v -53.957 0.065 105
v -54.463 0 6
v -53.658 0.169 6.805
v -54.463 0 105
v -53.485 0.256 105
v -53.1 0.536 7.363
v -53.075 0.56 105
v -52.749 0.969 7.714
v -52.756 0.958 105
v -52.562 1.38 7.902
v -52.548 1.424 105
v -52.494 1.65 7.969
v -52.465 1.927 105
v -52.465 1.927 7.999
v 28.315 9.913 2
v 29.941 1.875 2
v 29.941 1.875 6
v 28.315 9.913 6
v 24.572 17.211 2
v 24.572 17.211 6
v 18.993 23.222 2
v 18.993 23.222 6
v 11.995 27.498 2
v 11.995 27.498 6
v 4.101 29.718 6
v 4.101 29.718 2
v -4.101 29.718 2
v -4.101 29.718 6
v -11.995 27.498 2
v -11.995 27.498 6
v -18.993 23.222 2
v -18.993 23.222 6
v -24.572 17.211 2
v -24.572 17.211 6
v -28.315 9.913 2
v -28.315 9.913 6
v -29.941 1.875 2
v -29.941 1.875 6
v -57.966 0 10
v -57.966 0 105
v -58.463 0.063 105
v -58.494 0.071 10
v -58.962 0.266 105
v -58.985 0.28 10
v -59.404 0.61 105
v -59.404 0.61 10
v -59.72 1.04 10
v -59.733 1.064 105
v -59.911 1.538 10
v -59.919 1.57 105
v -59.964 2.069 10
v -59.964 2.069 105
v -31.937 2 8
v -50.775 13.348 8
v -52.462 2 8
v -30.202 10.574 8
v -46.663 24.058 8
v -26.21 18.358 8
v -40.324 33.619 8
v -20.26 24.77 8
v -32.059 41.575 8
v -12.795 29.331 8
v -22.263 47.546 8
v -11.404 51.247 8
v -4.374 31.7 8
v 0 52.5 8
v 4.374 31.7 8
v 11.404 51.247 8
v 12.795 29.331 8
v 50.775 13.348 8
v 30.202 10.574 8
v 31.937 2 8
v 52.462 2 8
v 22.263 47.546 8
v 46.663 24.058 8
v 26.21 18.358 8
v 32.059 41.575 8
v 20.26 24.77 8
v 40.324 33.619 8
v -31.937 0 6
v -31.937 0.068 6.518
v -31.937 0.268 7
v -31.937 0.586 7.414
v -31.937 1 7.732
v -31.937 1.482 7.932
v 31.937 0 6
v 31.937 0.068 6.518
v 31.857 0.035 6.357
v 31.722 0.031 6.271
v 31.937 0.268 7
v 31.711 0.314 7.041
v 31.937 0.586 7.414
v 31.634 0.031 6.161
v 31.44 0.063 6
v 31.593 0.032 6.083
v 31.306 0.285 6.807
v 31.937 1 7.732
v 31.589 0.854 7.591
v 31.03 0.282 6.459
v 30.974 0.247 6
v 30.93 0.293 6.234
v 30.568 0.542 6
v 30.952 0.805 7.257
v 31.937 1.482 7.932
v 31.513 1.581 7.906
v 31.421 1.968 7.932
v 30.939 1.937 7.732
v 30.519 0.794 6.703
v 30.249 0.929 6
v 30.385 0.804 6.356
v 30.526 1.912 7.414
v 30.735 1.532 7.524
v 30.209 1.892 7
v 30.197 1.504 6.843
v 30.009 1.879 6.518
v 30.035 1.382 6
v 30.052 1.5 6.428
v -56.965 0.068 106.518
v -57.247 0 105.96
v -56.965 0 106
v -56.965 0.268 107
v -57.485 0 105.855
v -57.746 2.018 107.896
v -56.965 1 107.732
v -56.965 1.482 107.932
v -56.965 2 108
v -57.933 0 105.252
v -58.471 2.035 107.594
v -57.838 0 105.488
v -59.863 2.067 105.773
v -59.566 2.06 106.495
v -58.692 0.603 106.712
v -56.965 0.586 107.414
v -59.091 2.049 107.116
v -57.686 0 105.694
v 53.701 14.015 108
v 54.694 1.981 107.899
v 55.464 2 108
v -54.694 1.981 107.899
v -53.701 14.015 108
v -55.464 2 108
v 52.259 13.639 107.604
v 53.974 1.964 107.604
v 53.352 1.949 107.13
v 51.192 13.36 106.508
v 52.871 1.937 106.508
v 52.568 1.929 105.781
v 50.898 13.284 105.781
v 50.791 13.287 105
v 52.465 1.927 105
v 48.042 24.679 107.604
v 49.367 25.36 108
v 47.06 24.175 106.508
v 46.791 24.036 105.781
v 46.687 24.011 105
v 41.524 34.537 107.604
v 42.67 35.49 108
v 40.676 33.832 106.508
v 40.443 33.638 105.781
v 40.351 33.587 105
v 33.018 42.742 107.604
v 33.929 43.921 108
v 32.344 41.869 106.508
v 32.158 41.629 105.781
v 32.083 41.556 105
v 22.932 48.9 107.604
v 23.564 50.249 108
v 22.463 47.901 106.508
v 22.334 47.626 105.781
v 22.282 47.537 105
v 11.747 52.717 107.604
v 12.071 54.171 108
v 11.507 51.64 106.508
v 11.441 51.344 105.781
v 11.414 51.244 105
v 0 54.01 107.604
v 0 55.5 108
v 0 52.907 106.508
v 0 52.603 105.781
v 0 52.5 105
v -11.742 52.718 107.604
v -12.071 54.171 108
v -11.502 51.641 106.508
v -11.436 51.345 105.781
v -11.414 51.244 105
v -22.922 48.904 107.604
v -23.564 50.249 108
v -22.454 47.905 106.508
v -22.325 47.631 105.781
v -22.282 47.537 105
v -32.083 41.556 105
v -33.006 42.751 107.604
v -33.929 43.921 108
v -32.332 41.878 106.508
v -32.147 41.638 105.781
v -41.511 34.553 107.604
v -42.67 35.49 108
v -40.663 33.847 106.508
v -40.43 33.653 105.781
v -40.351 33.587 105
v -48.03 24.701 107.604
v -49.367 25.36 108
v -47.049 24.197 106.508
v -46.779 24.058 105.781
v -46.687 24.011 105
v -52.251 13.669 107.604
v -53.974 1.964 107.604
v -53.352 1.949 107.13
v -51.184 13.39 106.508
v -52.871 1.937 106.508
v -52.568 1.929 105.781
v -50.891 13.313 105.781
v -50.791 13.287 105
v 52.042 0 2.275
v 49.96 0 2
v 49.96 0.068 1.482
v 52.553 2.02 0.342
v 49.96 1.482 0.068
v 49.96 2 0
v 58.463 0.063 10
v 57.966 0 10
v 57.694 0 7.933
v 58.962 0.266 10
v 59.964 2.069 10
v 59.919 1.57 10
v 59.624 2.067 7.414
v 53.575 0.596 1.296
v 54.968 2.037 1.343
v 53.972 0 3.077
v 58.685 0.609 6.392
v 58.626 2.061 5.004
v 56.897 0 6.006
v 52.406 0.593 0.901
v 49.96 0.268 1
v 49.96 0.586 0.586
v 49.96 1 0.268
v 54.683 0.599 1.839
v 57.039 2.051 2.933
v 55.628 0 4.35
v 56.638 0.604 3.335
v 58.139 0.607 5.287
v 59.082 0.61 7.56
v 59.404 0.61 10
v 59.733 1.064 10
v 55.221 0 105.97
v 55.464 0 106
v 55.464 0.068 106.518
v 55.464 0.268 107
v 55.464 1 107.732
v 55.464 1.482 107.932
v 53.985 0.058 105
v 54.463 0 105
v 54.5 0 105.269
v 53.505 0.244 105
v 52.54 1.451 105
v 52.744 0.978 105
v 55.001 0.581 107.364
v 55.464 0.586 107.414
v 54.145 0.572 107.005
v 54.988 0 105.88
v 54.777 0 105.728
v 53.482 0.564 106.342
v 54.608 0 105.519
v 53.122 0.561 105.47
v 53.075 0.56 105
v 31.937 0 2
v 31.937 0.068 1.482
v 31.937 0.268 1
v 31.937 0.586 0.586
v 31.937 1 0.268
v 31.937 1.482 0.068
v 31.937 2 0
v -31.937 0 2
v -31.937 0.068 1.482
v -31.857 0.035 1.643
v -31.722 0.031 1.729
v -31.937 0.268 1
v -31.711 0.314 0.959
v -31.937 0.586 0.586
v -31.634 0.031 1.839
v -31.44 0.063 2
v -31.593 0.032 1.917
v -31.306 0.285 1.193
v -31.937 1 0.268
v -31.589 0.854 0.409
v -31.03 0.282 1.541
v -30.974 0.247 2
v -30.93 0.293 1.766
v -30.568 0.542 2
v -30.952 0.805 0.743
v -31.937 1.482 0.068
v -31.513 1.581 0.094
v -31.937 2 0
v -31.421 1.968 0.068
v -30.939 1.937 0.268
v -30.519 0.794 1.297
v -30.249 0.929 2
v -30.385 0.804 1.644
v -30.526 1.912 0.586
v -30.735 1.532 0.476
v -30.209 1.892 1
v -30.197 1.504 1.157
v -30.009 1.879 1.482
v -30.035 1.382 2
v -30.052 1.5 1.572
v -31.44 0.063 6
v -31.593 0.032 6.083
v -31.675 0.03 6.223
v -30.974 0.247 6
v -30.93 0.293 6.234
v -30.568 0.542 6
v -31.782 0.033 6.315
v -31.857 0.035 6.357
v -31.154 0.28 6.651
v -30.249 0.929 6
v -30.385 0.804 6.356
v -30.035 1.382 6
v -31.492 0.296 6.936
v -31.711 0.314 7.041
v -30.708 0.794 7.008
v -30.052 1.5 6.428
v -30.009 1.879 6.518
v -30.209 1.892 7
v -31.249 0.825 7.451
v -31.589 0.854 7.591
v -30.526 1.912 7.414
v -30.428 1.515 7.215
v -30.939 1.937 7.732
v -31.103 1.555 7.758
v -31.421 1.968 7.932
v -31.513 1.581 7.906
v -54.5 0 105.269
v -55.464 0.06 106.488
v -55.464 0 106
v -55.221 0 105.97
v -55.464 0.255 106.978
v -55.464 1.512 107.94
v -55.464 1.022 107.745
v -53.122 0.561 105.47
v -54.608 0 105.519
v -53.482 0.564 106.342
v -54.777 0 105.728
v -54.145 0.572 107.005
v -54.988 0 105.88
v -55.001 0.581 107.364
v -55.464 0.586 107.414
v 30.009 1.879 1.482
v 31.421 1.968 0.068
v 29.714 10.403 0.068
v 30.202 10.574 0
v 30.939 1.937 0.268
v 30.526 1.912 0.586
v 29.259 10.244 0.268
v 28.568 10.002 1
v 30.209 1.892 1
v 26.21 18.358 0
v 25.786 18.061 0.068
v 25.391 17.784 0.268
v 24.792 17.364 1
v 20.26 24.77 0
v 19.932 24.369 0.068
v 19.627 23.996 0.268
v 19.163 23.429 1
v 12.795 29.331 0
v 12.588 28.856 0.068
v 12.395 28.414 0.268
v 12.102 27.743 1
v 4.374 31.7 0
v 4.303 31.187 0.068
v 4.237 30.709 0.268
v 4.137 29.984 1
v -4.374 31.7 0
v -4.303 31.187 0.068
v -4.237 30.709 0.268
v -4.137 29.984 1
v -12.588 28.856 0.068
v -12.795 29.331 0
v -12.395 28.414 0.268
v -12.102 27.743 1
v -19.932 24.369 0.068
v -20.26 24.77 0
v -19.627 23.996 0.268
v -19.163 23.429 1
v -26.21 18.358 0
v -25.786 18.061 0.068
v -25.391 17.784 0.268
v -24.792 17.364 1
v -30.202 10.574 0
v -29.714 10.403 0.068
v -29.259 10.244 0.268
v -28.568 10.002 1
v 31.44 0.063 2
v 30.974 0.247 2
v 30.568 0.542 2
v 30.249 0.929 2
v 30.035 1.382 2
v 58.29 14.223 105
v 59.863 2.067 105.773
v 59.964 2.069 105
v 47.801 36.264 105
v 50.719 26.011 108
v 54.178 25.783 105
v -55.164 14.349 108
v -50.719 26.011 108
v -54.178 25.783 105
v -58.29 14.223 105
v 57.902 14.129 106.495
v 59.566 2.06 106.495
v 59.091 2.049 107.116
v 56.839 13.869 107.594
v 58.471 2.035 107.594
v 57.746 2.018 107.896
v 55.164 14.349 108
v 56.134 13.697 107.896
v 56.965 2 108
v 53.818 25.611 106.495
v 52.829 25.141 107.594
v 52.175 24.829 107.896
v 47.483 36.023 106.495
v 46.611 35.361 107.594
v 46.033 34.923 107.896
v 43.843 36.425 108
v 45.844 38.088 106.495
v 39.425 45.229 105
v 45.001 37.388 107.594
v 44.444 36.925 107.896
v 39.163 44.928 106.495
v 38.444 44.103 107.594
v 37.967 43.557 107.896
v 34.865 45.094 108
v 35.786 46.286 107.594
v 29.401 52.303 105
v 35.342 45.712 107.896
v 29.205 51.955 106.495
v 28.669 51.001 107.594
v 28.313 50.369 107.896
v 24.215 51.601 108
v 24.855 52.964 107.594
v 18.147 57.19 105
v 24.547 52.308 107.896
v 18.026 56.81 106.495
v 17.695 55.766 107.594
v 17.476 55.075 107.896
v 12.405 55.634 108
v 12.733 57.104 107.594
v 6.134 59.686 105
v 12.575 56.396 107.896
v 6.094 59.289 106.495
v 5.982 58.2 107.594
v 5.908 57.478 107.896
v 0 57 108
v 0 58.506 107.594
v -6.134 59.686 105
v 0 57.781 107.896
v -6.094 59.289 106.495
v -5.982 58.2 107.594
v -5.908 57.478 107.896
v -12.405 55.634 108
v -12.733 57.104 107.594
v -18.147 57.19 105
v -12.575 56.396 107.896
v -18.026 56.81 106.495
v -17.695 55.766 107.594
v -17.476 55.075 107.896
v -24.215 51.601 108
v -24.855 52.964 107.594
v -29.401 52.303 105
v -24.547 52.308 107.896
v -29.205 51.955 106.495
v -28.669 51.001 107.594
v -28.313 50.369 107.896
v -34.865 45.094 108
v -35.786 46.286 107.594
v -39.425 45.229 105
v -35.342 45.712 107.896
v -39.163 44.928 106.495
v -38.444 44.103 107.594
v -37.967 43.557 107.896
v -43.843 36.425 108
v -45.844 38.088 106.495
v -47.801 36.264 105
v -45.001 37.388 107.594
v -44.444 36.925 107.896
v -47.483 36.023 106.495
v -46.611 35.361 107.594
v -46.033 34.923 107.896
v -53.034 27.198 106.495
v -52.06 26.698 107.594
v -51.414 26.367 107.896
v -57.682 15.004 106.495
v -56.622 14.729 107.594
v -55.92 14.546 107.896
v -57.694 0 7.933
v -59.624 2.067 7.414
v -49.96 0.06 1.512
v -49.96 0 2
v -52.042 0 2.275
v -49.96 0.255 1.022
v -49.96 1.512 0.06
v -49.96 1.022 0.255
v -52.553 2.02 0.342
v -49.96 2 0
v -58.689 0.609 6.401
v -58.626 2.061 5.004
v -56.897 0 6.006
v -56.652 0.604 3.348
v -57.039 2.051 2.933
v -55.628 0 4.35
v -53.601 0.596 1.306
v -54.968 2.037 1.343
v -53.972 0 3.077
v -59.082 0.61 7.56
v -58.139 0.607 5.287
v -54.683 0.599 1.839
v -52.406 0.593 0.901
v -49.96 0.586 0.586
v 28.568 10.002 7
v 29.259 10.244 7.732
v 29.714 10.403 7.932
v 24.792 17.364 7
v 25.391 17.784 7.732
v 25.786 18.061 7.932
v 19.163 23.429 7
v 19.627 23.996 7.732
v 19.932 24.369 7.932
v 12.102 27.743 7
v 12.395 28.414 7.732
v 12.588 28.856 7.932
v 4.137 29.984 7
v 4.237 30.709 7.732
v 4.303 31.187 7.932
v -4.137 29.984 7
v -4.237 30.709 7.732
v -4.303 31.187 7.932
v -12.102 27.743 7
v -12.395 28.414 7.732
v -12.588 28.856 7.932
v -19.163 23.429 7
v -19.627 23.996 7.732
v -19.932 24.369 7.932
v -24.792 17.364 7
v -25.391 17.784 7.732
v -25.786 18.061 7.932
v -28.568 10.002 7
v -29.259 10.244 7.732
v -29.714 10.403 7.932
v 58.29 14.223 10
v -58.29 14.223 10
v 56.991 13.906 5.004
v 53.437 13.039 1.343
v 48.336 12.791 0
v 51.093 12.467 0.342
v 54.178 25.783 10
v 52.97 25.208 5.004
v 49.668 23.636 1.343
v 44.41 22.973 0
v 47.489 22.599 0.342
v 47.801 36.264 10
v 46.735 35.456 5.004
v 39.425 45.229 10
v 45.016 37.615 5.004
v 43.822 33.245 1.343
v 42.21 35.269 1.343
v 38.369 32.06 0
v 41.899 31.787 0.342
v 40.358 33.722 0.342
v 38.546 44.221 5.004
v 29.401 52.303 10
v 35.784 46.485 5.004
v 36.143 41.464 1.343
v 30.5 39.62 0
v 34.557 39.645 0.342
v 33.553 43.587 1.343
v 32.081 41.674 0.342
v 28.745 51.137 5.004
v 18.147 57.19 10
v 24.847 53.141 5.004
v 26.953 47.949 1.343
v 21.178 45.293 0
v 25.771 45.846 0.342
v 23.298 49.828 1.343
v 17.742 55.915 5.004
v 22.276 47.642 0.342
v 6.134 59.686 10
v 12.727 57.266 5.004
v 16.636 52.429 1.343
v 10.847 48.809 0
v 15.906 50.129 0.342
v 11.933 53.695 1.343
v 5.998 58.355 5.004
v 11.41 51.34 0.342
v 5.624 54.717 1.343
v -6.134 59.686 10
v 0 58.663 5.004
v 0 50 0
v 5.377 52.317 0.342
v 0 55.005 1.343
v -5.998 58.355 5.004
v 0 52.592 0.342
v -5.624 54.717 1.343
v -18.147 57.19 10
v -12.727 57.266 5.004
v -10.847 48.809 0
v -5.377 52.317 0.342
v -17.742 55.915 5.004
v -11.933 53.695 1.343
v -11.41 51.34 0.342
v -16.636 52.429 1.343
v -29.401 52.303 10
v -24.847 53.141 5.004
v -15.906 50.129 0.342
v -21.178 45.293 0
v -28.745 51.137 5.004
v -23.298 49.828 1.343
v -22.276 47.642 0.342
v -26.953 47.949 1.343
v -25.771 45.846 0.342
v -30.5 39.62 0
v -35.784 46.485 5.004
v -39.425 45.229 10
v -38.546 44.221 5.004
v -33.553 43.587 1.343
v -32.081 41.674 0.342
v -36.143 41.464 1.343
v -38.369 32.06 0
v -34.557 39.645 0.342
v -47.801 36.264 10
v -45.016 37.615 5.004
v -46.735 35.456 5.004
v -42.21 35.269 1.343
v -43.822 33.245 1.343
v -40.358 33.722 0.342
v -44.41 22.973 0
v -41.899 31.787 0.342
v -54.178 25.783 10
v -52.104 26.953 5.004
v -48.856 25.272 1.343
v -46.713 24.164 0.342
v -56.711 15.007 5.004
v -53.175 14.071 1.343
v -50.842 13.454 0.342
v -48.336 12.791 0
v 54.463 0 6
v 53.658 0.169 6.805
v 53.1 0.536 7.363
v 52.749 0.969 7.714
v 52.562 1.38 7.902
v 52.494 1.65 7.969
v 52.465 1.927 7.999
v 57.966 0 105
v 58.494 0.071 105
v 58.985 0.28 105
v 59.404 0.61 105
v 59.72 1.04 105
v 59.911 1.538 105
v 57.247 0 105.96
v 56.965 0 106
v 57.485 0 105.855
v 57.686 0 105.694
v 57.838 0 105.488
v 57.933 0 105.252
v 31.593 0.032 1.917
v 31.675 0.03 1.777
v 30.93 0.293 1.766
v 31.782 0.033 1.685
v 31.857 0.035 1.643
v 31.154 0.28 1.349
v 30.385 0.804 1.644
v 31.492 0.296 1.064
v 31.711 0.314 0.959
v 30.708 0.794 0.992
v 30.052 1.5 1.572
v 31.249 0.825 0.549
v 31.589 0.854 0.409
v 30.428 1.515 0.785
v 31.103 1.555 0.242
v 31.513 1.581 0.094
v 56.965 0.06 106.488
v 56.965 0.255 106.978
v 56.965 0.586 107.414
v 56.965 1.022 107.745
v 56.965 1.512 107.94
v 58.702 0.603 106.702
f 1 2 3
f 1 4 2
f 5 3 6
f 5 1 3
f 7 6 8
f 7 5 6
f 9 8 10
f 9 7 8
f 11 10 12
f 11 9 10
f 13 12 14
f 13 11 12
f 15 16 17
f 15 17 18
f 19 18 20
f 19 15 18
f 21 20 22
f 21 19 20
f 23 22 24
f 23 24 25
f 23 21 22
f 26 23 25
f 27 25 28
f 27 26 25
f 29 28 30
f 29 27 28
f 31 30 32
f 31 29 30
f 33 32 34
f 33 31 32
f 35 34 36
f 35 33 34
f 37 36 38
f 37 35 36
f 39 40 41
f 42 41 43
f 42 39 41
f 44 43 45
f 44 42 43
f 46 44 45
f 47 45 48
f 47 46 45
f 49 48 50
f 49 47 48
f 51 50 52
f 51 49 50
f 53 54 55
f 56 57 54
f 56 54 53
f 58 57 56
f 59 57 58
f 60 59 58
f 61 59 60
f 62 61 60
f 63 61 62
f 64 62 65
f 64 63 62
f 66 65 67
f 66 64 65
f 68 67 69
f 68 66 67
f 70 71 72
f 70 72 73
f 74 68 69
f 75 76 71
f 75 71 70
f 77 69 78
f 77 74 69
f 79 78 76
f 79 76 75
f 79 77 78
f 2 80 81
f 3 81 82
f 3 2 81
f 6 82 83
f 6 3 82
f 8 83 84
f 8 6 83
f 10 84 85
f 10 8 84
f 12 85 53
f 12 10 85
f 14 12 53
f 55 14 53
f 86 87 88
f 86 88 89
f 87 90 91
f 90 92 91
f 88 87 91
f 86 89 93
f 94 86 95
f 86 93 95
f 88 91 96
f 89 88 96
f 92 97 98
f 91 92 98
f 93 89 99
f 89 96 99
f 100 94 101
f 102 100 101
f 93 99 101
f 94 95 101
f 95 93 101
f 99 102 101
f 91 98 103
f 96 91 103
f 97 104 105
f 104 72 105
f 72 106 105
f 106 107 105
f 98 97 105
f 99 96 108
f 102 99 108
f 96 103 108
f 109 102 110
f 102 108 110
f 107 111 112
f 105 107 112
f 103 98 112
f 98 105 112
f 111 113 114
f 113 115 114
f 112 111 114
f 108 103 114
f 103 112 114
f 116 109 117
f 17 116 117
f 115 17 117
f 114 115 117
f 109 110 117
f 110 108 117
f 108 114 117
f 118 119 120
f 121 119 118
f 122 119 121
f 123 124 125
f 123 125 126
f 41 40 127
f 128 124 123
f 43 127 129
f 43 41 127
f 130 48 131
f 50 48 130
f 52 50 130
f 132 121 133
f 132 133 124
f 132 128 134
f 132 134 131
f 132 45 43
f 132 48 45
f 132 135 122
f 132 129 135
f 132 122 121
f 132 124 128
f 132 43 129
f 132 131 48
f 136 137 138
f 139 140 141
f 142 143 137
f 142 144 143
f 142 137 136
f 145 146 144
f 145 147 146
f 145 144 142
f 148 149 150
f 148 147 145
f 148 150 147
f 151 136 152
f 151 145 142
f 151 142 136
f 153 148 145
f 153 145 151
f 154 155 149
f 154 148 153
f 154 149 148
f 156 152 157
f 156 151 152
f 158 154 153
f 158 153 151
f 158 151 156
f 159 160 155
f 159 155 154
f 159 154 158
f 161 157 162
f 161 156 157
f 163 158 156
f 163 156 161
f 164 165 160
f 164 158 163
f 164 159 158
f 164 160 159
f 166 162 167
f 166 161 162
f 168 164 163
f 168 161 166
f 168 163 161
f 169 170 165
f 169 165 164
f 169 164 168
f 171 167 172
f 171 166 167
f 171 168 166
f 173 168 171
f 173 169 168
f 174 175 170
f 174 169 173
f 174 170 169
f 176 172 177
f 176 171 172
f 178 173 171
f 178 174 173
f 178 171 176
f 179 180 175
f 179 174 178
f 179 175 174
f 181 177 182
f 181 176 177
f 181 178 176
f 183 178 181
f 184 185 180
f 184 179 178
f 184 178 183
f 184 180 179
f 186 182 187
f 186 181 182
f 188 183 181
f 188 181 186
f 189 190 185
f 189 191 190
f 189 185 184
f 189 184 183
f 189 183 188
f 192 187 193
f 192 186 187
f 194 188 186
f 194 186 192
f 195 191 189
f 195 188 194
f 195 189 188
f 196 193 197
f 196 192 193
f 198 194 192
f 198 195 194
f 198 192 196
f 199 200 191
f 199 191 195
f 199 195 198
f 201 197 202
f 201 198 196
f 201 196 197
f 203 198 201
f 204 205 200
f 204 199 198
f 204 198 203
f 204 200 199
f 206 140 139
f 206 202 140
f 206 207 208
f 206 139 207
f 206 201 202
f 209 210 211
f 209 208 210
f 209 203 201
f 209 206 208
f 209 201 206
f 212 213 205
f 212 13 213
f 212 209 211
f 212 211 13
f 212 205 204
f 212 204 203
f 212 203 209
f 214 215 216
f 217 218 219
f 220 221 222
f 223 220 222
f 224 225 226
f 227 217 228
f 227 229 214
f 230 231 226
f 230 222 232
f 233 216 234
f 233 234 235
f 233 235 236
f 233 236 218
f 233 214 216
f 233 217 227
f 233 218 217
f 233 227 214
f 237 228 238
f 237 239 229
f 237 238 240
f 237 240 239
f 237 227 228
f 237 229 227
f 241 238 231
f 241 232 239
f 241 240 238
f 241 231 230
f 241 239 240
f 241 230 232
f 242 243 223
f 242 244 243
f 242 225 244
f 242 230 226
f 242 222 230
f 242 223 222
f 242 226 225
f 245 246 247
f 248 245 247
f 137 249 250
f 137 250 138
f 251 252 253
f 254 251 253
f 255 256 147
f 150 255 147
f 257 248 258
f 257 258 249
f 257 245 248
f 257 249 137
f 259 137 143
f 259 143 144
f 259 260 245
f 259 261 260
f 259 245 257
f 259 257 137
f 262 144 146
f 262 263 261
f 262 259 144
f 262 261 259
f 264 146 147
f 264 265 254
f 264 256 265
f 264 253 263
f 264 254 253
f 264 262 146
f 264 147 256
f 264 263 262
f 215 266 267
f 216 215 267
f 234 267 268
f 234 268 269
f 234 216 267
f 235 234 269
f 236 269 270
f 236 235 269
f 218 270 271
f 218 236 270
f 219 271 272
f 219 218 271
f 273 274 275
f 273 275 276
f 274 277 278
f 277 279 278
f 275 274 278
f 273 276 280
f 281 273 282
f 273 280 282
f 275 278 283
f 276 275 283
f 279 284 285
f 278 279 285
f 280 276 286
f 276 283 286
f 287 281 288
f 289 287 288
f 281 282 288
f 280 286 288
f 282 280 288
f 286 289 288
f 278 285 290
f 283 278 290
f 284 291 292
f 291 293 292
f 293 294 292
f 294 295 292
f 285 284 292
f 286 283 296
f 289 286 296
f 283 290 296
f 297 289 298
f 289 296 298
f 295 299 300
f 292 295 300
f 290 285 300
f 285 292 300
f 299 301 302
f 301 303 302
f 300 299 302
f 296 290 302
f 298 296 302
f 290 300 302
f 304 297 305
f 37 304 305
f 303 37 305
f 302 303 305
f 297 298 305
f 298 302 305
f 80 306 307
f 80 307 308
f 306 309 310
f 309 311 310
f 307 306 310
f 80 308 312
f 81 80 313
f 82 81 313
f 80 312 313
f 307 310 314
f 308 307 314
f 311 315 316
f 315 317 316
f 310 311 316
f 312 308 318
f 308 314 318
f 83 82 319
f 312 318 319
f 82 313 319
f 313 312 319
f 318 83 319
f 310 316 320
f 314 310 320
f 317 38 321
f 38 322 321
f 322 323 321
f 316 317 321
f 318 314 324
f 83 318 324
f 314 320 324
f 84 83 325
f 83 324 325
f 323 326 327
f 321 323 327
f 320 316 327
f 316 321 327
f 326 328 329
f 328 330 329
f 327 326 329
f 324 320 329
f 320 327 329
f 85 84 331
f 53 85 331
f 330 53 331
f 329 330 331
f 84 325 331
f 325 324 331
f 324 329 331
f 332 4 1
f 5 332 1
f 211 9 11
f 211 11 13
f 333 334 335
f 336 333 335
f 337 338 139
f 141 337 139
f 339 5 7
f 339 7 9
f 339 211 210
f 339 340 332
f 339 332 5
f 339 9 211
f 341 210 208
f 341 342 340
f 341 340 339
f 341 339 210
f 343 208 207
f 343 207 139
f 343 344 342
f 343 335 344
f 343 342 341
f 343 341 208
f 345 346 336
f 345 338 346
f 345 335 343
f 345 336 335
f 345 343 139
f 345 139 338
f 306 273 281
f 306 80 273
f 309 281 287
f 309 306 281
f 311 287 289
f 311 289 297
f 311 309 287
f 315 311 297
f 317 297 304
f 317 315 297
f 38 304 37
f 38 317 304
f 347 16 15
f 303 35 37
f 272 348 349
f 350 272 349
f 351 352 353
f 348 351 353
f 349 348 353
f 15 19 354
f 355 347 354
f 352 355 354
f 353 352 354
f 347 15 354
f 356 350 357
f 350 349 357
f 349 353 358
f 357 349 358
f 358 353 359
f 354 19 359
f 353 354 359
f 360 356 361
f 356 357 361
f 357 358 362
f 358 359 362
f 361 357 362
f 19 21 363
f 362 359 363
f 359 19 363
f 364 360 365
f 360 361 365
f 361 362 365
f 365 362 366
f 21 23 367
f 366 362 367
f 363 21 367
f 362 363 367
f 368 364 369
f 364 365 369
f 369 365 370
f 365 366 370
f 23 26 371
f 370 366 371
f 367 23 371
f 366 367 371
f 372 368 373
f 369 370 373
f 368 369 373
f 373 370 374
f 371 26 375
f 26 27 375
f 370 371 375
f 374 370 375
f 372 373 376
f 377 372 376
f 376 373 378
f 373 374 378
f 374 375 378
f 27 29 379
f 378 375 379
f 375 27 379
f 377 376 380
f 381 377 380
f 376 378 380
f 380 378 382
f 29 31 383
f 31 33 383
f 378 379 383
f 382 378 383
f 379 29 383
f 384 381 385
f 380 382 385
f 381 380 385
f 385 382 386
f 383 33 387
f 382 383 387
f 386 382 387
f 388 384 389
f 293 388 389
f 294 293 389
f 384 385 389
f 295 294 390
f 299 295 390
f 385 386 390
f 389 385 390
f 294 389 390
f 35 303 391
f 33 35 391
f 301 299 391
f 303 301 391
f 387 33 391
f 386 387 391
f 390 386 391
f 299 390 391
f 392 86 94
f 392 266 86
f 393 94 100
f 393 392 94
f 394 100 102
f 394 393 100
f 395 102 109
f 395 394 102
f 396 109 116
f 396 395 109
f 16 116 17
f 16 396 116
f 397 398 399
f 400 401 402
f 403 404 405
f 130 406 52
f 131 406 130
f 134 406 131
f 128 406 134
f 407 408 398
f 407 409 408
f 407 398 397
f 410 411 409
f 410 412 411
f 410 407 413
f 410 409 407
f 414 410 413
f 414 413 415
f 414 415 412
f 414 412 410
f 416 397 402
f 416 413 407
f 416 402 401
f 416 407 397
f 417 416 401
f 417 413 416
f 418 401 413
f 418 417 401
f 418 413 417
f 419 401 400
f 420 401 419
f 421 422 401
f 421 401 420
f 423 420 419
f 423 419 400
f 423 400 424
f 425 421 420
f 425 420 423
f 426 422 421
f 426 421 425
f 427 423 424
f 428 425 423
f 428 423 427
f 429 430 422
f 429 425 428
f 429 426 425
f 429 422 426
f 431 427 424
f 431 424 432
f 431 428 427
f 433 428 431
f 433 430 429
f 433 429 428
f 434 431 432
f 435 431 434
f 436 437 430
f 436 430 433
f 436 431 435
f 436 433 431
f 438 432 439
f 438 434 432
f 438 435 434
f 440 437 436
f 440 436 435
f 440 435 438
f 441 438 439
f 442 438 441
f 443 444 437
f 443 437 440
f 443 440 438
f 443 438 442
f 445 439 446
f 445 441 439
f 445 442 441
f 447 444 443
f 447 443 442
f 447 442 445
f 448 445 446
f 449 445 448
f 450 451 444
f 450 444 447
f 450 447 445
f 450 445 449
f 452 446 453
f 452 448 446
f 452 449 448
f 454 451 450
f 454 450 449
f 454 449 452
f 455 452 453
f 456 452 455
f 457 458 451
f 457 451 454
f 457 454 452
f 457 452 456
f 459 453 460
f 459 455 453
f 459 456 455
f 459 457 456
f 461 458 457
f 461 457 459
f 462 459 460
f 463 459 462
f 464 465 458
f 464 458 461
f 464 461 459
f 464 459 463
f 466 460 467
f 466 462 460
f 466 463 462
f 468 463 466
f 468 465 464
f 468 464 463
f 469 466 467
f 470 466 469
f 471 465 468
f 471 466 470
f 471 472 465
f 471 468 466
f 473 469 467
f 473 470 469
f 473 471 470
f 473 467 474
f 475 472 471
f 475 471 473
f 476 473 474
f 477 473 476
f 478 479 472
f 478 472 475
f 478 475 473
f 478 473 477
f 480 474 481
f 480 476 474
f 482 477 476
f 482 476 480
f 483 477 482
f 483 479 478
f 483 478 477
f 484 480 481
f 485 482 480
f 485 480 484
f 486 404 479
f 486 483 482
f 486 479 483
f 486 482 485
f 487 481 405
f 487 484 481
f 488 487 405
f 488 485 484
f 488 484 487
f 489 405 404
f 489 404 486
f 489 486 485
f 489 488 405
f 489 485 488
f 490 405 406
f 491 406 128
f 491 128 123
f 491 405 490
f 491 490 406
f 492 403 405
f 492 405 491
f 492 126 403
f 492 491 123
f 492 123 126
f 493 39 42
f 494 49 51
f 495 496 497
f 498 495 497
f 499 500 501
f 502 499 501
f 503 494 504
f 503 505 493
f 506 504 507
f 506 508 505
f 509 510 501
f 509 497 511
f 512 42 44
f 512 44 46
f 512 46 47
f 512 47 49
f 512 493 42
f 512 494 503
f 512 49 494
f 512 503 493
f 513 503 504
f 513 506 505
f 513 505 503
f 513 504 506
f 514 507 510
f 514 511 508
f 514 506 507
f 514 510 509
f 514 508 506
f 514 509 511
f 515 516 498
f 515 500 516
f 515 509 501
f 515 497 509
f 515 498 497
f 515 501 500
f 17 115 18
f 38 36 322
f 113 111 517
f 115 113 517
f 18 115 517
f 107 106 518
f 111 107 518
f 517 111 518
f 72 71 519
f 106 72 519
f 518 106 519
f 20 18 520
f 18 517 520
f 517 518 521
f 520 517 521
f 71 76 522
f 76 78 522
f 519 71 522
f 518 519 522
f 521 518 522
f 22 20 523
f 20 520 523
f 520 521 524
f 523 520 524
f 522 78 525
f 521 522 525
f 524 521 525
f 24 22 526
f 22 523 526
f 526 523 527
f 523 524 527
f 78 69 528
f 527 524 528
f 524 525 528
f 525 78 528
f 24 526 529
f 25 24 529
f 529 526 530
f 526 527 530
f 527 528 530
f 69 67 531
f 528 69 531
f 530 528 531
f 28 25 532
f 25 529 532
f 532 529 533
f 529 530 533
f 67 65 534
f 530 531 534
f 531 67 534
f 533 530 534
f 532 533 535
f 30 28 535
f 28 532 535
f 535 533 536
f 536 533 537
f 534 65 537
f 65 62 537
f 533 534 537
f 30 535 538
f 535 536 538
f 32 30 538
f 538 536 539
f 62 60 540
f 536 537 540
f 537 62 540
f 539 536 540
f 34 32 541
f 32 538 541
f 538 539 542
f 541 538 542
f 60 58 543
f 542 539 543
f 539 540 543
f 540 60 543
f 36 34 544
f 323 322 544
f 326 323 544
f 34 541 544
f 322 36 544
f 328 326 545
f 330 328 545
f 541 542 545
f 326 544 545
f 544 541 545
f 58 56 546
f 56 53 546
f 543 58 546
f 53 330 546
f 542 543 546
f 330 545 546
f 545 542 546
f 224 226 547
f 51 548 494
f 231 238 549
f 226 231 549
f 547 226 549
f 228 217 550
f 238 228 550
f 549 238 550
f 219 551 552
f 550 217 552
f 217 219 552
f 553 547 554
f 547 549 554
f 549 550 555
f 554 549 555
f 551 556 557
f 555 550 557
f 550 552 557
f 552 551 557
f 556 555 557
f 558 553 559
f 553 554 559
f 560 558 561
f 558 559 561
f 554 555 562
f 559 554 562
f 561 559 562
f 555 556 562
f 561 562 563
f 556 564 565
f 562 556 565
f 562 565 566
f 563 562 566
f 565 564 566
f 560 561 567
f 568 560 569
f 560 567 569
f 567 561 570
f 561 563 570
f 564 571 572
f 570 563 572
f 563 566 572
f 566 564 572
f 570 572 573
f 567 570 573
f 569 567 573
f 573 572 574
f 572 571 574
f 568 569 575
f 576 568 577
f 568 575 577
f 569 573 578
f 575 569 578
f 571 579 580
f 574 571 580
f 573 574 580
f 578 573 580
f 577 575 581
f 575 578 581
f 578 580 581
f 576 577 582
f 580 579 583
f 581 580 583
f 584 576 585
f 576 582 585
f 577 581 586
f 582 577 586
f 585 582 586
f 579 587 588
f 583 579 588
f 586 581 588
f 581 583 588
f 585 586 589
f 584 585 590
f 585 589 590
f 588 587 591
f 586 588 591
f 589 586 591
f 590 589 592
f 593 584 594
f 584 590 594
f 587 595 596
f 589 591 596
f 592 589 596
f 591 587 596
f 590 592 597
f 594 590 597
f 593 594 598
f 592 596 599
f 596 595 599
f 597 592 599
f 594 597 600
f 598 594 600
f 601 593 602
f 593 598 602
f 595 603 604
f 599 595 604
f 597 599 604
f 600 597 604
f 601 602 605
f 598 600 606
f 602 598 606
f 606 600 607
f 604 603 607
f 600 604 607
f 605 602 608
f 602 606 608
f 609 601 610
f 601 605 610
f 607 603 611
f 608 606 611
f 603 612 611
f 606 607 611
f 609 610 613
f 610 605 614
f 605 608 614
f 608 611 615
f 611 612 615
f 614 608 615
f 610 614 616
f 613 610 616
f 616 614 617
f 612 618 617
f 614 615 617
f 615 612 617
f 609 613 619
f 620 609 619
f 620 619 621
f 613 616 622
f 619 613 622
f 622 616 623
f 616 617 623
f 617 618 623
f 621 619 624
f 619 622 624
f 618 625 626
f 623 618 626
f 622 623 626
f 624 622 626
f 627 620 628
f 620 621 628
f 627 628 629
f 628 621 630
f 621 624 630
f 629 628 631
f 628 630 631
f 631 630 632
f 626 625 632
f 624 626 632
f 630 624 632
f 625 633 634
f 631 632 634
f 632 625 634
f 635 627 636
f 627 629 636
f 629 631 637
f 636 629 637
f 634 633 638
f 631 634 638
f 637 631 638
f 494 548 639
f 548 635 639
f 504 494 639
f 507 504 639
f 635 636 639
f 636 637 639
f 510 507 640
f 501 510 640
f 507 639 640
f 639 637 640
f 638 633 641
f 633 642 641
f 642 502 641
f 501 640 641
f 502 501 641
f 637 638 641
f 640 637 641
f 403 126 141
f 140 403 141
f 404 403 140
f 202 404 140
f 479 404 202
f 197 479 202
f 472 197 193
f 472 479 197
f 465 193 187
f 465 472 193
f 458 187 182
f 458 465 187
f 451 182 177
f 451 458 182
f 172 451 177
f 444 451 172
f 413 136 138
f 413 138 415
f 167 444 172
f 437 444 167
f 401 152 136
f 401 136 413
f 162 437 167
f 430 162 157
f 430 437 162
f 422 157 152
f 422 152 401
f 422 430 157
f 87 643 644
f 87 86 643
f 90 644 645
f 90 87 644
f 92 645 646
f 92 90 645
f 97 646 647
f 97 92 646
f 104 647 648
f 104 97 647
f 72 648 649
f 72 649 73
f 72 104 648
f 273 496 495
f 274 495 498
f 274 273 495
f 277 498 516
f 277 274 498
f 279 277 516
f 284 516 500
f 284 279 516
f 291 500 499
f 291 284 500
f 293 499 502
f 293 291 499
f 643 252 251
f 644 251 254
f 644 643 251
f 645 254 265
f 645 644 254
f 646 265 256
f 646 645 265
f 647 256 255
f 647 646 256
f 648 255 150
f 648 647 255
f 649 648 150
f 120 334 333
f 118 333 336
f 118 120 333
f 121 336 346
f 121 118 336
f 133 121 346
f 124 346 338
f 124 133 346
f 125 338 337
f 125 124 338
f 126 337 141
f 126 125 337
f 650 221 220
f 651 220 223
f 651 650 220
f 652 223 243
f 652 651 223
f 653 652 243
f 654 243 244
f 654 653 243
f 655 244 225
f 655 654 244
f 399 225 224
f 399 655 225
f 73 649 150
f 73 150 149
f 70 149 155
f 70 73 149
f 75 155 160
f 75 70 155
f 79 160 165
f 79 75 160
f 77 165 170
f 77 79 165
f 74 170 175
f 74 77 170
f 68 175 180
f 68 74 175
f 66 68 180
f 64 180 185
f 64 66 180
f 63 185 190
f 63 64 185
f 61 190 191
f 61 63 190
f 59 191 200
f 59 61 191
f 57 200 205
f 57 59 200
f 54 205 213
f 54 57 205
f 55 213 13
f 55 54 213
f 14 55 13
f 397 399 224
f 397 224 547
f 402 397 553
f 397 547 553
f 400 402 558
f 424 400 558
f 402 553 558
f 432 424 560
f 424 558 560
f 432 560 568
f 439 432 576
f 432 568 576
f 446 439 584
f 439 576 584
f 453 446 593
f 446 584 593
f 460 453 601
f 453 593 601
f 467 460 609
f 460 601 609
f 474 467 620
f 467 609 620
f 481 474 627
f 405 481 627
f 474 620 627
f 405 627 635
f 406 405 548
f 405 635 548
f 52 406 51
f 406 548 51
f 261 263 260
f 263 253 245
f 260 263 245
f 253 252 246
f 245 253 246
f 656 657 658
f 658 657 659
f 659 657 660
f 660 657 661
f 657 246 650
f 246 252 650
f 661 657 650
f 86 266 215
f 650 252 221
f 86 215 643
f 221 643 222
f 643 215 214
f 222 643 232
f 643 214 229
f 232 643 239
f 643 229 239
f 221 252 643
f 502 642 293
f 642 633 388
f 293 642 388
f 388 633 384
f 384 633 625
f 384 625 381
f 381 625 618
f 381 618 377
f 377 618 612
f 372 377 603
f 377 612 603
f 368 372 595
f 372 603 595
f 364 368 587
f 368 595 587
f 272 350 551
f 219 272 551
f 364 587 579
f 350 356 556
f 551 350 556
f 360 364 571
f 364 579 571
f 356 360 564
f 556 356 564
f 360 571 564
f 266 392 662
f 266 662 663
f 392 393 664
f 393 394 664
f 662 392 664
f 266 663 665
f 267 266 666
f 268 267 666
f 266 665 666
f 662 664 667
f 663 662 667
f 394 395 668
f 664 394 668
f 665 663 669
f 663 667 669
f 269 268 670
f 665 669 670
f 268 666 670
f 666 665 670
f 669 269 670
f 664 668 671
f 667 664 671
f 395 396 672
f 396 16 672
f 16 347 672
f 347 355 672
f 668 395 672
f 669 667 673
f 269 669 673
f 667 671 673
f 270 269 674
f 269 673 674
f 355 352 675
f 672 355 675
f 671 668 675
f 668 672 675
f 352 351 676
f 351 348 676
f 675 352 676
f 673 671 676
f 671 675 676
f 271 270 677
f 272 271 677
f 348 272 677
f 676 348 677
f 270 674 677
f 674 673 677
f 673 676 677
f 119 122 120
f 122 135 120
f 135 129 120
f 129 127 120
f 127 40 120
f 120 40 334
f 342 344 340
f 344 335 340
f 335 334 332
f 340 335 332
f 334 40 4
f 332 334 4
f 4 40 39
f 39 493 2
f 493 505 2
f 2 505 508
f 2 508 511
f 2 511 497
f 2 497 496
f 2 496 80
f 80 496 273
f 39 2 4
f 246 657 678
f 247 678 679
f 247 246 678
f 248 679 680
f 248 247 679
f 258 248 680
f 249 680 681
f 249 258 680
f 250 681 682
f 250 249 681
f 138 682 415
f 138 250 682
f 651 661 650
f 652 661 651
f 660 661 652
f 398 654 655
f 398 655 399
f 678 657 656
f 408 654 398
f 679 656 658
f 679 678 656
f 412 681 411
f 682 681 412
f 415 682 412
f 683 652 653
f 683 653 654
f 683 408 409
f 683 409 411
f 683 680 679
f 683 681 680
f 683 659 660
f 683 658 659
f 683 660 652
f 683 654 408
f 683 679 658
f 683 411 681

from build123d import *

# Parameters (mm, degrees)
SKETCH_R      = 60
SKETCH_R_2    = 30
PAD_DEPTH     = 8
SKETCH001_R   = 60
SKETCH001_R_2 = 52.5
PAD001_DEPTH  = 100
FILLET_R      = 10
FILLET001_R   = 2
FILLET002_R   = 3
SKETCH002_W   = 200
SKETCH002_H   = 80
POCKET_DEPTH  = 108.001
FILLET003_R   = 2


with BuildPart() as part:
    # Sketch → Pad (new body)
    with BuildSketch(Plane.XY):
        Circle(SKETCH_R)
        Circle(SKETCH_R_2, mode=Mode.SUBTRACT)
    extrude(amount=PAD_DEPTH)

    # Sketch001 (on Face4 of Pad) → Pad001 (join)
    with BuildSketch(Plane.XY.offset(8)):
        Circle(SKETCH001_R)
        Circle(SKETCH001_R_2, mode=Mode.SUBTRACT)
    extrude(amount=PAD001_DEPTH)

    # Fillet
    fillet_edges = [part.edges().sort_by_distance(p)[0] for p in [
        (-60, 0, 0),
    ]]
    fillet(fillet_edges, radius=FILLET_R)

    # Fillet001
    fillet001_edges = [part.edges().sort_by_distance(p)[0] for p in [
        (-30, 0, 0),
        (-30, 0, 8),
    ]]
    fillet(fillet001_edges, radius=FILLET001_R)

    # Fillet002
    fillet002_edges = [part.edges().sort_by_distance(p)[0] for p in [
        (-52.5, 0, 108),
        (-60, 0, 108),
    ]]
    fillet(fillet002_edges, radius=FILLET002_R)

    # Sketch002 (on Face5 of Fillet002) → Pocket (cut, through all)
    with BuildSketch(Plane(origin=(0, 0, 0), x_dir=(1, 0, 0), z_dir=(0, 0, -1))):
        with Locations((0, 40)):
            Rectangle(SKETCH002_W, SKETCH002_H)
    extrude(amount=-POCKET_DEPTH, mode=Mode.SUBTRACT)

    # Fillet003
    fillet003_edges = [part.edges().sort_by_distance(p)[0] for p in [
        (-41, 0, 0),
        (-57.071068, 0, 2.928932),
        (-60, 0, 57.5),
        (-59.12132, 0, 107.12132),
        (-56.25, 0, 108),
        (-53.37868, 0, 107.12132),
        (-52.5, 0, 56.5),
        (-42.25, 0, 8),
        (-30.585786, 0, 7.414214),
        (-30, 0, 4),
        (-30.585786, 0, 0.585786),
        (41, 0, 0),
        (30.585786, 0, 0.585786),
        (30, 0, 4),
        (30.585786, 0, 7.414214),
        (42.25, 0, 8),
        (52.5, 0, 56.5),
        (53.37868, 0, 107.12132),
        (56.25, 0, 108),
        (59.12132, 0, 107.12132),
        (60, 0, 57.5),
        (57.071067, 0, 2.928931),
    ]]
    fillet(fillet003_edges, radius=FILLET003_R)


solid = part.part
